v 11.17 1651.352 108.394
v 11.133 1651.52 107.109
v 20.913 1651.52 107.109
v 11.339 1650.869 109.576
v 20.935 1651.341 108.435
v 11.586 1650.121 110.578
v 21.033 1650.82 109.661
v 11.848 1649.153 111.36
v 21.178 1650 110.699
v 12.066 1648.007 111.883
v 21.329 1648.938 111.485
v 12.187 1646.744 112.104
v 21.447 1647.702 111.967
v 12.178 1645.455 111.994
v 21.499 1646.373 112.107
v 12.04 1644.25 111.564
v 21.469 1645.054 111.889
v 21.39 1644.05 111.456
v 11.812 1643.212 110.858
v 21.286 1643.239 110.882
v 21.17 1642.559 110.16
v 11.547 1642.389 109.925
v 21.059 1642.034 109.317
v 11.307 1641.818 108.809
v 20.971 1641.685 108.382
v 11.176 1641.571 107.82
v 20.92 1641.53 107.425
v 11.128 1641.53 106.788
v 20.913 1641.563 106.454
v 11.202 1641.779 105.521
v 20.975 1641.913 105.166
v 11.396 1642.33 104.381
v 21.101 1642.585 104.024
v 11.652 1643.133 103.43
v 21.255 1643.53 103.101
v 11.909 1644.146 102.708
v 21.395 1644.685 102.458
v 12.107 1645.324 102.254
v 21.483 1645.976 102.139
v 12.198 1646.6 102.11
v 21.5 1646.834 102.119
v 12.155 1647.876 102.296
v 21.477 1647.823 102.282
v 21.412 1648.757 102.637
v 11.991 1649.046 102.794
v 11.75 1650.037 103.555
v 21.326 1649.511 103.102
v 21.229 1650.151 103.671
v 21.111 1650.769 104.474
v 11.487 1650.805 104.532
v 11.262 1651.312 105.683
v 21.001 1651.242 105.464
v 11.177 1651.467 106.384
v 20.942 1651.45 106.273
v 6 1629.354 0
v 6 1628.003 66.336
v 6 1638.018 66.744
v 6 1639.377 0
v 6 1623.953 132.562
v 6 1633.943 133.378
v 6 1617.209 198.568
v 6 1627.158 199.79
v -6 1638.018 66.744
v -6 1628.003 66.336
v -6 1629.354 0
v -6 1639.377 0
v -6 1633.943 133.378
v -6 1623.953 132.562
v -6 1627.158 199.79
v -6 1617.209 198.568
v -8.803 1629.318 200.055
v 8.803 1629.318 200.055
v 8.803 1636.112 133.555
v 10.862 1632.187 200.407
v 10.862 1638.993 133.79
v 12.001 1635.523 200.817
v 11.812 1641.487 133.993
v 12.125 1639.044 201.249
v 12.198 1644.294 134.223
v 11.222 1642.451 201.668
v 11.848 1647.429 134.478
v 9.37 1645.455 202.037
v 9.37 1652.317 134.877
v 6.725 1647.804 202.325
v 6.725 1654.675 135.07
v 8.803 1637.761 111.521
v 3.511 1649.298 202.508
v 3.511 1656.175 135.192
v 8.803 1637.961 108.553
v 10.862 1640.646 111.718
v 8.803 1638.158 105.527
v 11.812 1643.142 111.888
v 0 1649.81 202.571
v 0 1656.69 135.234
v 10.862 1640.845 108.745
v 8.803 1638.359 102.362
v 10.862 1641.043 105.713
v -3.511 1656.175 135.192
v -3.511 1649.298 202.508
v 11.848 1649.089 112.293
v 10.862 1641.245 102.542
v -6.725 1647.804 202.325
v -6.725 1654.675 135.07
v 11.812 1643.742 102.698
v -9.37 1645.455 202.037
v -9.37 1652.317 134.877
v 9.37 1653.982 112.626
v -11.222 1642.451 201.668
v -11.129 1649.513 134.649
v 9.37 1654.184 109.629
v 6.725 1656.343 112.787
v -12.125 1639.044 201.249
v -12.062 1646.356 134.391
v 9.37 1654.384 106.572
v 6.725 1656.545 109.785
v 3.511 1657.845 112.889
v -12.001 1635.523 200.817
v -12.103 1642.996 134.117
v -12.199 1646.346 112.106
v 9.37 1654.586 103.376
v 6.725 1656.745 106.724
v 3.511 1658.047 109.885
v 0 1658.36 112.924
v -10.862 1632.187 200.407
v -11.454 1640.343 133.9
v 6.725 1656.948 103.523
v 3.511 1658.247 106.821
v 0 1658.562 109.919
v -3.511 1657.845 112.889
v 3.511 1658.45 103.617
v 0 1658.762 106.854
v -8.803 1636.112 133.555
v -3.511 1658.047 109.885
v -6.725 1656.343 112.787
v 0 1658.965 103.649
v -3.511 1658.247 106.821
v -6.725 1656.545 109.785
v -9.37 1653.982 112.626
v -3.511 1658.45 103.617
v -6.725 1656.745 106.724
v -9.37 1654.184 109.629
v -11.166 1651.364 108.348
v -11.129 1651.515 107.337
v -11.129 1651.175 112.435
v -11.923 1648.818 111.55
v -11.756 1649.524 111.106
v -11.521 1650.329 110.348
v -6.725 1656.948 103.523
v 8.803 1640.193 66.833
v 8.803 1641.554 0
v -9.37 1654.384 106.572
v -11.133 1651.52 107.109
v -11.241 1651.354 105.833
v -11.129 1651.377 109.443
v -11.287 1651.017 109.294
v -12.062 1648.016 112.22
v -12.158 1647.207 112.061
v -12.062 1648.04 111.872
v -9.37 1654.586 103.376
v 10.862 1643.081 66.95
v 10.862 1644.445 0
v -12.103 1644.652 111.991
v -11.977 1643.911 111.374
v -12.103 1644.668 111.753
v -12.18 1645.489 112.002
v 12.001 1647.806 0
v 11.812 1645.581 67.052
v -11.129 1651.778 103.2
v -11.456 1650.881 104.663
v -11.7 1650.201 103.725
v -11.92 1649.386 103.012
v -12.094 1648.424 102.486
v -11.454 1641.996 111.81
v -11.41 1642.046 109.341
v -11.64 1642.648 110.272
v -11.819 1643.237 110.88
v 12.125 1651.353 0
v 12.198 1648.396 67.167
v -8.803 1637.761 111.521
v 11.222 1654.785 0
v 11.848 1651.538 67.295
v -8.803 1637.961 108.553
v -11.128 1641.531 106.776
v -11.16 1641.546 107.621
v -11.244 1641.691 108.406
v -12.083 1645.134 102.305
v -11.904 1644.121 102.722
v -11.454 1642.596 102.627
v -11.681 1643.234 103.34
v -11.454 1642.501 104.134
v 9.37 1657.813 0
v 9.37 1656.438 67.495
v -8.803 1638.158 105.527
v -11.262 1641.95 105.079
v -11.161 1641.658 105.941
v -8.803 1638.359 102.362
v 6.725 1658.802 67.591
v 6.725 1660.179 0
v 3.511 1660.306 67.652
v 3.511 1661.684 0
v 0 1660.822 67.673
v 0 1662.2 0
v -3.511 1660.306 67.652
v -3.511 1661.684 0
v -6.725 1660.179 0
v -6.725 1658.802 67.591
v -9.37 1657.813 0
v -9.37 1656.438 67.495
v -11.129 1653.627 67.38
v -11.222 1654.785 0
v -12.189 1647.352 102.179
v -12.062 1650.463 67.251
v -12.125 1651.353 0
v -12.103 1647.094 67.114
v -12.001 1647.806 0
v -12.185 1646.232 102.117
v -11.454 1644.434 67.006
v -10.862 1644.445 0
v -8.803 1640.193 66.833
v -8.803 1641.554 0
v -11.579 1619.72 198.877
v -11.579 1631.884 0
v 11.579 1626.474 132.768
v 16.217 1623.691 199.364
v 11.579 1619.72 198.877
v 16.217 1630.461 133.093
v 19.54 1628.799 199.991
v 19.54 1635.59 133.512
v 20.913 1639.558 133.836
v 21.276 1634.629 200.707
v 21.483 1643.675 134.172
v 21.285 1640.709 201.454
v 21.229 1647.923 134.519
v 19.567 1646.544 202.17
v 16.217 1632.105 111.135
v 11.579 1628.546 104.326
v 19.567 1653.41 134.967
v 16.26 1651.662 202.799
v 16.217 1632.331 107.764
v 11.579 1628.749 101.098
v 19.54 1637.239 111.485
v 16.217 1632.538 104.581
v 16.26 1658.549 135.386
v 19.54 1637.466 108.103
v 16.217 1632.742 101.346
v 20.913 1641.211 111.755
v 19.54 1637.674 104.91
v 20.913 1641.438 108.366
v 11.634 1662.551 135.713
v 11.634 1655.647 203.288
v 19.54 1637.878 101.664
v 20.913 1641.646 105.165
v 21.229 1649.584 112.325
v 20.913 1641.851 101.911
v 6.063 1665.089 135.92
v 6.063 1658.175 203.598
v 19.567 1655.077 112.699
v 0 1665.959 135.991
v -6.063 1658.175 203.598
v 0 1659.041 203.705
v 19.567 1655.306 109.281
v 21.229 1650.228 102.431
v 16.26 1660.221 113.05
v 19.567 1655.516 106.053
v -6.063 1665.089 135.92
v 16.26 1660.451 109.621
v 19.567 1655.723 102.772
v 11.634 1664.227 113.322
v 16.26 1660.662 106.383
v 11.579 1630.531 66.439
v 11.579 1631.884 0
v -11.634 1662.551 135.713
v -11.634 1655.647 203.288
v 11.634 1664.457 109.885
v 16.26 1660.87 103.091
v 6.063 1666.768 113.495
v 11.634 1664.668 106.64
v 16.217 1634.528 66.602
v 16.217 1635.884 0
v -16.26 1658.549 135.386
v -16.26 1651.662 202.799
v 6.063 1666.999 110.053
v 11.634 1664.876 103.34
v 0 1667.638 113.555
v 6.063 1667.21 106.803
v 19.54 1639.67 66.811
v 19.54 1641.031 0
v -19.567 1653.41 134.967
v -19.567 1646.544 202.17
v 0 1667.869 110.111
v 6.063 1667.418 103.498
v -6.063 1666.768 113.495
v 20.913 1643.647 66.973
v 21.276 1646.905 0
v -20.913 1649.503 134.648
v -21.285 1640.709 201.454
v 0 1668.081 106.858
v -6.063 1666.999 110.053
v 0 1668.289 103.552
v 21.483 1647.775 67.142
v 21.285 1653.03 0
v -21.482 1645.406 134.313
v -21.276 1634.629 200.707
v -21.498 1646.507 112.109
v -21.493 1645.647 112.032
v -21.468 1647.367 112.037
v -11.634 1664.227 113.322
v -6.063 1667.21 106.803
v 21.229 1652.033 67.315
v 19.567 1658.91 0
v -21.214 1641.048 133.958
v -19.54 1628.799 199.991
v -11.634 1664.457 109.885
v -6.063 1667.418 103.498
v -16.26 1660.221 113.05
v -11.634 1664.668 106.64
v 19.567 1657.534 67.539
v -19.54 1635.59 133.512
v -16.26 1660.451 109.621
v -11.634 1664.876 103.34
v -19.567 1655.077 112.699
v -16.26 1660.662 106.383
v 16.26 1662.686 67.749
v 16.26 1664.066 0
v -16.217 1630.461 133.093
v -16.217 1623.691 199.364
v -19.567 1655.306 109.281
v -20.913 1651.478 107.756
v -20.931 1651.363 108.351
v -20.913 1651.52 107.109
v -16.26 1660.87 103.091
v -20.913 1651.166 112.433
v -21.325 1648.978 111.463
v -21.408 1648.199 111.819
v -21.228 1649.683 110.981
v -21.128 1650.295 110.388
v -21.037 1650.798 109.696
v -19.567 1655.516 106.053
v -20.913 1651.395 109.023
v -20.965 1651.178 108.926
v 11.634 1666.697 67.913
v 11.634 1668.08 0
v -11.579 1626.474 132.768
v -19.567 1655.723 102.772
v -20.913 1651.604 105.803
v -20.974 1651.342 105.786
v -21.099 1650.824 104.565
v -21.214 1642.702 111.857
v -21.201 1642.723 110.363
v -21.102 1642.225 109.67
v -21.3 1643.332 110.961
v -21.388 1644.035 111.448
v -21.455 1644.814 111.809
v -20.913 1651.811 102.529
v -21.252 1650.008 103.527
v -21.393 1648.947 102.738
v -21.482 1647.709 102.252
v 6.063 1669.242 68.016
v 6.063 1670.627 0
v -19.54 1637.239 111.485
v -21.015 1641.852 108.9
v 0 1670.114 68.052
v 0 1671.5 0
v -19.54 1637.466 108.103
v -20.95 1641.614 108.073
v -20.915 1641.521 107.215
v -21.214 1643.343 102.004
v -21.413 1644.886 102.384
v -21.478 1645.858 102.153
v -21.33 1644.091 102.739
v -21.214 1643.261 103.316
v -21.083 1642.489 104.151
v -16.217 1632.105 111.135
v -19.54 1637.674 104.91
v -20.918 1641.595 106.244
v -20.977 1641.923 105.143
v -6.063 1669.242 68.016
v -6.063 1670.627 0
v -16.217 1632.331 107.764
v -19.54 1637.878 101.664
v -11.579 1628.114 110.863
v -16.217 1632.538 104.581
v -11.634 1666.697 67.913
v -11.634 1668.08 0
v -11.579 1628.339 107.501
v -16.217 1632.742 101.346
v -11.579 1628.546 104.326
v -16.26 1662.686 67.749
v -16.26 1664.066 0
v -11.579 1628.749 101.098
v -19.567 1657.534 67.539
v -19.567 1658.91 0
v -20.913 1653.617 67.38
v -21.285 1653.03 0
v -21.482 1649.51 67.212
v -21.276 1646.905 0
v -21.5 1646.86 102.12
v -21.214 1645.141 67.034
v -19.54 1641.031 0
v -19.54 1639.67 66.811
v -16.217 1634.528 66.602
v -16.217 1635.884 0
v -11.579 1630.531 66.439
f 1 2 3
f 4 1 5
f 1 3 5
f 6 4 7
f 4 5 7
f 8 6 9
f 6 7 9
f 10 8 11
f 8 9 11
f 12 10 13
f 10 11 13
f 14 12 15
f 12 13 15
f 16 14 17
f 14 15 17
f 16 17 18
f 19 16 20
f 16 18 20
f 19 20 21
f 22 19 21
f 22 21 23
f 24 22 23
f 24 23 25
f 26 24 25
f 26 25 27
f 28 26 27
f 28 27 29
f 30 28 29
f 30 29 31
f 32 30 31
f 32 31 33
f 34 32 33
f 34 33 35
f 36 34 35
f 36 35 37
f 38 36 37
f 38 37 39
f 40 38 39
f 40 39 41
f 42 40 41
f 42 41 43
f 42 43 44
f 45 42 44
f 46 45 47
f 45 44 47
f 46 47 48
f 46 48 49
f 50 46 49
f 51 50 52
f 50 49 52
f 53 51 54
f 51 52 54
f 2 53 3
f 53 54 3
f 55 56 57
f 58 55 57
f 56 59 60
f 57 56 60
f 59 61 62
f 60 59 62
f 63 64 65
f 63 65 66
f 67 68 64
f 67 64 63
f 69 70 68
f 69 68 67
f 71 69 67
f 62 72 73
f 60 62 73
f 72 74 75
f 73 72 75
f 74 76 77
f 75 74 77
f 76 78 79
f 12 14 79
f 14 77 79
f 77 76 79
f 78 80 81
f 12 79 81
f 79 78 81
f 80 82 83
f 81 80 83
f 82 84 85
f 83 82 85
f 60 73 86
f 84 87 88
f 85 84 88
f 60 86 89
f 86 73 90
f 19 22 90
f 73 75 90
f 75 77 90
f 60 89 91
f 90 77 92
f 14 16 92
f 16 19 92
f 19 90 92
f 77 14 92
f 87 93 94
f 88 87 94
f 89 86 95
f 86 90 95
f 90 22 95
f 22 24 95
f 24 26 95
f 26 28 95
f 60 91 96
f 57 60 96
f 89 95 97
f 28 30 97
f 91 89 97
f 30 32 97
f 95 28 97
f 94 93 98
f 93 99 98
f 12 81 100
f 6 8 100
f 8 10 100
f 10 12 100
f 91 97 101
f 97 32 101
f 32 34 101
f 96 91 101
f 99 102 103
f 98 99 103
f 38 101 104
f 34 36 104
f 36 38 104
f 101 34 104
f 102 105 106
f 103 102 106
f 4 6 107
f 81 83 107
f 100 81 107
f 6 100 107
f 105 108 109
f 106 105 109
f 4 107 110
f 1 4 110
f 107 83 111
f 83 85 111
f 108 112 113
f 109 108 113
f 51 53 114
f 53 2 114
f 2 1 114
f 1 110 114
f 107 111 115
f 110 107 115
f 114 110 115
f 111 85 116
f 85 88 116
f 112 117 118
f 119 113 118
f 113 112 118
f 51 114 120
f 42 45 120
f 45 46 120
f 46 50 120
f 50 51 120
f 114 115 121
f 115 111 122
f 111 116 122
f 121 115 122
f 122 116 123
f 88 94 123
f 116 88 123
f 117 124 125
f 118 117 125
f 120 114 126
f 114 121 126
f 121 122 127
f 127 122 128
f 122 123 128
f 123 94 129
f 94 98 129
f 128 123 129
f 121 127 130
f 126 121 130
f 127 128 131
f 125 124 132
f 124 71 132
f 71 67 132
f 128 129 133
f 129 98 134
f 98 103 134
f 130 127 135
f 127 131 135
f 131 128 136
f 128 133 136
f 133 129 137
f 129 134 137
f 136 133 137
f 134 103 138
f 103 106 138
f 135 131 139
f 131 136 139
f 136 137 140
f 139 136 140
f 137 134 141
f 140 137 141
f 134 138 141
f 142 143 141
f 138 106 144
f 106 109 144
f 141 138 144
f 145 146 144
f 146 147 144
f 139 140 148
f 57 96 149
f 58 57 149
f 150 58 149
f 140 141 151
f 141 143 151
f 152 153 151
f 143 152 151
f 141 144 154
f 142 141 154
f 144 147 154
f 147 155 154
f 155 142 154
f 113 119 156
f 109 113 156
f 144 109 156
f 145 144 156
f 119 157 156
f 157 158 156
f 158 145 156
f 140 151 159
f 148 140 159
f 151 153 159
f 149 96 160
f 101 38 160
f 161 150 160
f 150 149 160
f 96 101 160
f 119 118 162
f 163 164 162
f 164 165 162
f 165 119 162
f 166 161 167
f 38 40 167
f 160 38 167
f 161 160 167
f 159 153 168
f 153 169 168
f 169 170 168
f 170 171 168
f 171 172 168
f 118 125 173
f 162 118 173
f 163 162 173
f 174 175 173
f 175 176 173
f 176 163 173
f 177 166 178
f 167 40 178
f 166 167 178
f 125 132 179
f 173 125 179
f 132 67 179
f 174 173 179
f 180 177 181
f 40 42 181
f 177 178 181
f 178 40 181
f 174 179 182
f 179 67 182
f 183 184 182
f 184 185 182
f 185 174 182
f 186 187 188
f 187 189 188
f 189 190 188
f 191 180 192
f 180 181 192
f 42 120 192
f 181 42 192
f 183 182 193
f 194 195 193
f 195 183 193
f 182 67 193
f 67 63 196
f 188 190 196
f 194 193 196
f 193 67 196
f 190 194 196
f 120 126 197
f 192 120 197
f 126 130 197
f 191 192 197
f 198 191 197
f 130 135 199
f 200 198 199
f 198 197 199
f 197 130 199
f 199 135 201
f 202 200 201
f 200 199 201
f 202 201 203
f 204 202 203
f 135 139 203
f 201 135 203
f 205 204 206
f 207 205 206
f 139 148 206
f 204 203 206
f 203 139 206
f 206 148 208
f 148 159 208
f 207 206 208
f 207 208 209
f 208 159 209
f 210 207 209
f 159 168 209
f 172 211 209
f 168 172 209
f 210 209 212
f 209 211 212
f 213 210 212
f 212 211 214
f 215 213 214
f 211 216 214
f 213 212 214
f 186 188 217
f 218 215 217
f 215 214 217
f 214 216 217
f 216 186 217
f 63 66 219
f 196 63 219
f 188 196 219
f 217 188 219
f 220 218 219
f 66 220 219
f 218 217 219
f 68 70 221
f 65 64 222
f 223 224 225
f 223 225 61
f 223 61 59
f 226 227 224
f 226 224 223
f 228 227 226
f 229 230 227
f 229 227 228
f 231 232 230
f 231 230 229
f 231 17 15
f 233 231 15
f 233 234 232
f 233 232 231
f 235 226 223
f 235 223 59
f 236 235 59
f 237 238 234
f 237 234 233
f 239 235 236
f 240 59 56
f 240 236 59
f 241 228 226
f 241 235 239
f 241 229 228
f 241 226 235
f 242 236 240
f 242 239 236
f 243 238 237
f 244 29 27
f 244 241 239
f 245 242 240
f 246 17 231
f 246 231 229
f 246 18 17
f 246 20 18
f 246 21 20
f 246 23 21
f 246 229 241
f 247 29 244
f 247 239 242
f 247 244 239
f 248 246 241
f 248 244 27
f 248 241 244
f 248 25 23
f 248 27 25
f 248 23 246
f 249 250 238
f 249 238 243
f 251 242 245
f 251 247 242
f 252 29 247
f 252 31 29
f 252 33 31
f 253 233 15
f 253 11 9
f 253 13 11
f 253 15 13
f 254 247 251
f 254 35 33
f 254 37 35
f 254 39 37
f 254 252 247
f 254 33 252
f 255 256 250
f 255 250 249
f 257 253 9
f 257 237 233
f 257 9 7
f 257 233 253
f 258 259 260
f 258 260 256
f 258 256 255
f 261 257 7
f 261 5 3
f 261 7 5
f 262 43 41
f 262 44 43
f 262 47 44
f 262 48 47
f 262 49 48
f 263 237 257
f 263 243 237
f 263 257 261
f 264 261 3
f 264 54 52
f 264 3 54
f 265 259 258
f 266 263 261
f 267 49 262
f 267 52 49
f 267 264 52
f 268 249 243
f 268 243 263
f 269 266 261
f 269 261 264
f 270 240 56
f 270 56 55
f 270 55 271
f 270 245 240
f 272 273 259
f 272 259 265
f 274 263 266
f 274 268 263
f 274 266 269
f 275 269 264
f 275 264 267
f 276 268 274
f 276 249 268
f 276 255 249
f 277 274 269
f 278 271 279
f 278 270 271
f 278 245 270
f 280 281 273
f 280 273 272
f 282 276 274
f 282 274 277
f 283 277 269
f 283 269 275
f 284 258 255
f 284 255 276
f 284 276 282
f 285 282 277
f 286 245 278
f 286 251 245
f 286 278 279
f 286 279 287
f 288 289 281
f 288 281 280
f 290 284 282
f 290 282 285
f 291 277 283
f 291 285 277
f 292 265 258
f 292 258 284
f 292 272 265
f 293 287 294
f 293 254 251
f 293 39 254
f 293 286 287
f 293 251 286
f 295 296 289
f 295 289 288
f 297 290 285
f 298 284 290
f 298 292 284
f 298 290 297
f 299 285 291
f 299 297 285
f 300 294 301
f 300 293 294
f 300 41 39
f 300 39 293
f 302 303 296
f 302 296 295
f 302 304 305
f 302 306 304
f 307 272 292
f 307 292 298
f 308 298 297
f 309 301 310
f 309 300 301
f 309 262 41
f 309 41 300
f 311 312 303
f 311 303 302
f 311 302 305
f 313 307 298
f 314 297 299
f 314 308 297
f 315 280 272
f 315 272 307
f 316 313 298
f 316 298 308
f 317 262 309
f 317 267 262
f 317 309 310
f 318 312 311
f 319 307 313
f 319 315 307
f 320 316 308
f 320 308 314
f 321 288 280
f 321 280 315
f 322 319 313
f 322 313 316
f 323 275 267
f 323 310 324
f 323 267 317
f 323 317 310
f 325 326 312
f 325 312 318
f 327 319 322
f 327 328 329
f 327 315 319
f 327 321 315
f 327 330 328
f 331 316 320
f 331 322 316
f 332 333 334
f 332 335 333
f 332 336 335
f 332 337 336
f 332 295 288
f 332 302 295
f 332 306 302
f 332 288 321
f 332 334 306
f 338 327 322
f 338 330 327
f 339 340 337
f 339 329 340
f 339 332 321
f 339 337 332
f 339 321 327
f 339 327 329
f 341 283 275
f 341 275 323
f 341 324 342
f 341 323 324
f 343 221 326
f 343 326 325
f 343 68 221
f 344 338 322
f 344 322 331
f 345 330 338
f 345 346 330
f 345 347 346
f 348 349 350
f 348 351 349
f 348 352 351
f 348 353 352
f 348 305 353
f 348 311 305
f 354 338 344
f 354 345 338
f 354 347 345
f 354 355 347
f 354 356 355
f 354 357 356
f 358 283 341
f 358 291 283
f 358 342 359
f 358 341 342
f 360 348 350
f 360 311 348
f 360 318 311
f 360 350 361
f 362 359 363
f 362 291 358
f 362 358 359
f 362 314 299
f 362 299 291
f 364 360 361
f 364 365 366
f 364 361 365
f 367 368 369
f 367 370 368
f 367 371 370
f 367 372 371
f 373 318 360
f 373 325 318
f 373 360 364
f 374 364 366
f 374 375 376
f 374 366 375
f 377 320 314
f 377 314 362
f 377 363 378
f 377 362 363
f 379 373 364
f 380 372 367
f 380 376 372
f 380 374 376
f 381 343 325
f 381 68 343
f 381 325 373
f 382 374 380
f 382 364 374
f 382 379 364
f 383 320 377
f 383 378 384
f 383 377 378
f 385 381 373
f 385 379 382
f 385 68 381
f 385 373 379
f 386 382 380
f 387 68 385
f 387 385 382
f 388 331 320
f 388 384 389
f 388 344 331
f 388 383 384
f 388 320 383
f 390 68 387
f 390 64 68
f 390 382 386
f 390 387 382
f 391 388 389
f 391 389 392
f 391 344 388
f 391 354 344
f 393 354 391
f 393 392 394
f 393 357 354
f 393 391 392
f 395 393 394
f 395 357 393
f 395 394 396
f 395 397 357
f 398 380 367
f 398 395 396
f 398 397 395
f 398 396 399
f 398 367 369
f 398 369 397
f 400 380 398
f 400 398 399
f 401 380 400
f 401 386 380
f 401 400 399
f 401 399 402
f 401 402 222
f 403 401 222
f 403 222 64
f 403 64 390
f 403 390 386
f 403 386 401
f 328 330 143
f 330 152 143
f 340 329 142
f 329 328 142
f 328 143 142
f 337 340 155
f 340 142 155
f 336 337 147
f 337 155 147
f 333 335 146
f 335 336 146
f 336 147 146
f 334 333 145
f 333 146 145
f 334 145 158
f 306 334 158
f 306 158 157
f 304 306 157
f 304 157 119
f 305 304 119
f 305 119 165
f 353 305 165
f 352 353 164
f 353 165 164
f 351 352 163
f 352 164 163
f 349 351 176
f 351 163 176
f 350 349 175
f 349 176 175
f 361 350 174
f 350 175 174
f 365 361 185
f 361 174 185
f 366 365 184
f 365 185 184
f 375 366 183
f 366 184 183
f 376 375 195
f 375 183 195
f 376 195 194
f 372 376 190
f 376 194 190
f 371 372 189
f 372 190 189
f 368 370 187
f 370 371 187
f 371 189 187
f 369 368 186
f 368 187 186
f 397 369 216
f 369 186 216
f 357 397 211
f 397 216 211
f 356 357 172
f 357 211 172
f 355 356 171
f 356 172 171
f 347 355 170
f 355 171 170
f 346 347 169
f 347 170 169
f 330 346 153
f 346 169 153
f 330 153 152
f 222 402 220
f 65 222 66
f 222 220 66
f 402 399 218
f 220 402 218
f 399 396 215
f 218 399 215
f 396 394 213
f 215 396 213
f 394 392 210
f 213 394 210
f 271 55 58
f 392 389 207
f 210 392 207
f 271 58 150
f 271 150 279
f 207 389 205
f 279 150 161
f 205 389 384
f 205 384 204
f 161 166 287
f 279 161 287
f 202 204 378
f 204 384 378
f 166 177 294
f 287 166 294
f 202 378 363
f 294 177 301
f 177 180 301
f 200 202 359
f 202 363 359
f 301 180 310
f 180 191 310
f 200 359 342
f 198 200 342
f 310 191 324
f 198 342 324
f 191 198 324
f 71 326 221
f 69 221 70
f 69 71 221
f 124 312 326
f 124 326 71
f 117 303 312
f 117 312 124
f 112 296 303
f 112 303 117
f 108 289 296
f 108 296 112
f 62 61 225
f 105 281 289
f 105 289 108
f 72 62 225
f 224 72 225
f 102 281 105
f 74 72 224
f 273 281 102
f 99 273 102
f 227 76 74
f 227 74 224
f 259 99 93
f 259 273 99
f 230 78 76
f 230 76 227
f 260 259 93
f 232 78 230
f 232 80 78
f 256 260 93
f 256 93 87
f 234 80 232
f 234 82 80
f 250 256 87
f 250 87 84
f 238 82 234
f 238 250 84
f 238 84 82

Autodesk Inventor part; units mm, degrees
ref_plane "YZ Plane" through (0, 0, 0) normal (1, 0, 0) x (0, 1, 0)
ref_plane "XZ Plane" through (0, 0, 0) normal (0, 1, 0) x (-1, 0, 0)
ref_plane "XY Plane" through (0, 0, 0) normal (0, 0, 1) x (1, 0, 0)
sketch "Sketch1" plane through (0, 0, 0) normal (1, 0, 0) x (0, 1, 0)
  circle A0 centre (0, 0) radius 1650
  dimension "d0" = 3300
sketch "Sketch2" plane through (0, 0, 0) normal (0, 0, 1) x (1, 0, 0)
  circle A0 centre (0, 1650) radius 21.5
  circle A1 centre (0, 1650) radius 12.2
  line L0 (-30.1, 0) -> (30.1, 0) projected
  point P0 (0, 0)
  dimension "d1" = 1650
  dimension "d2" = 0
  dimension "d3" = 43
  dimension "d4" = 9.3
revolve "Revolution1" add sketch "Sketch2" angle 7 about axis through (-10, 0, 0) along (1, 0, 0)
sketch "Sketch3" plane through (0, 0, 0) normal (1, 0, 0) x (0, 1, 0)
  line L0 (1642.6517, 530.7226) -> (1398.8963, 530.7226)
  line L1 (1398.8963, 530.7226) -> (1398.8963, -338.3635)
  line L2 (1398.8963, -338.3635) -> (1642.6517, -338.3635)
  line L3 (1642.6517, -338.3635) -> (1642.6517, 530.7226)
  point P0 (0, 0)
extrude "Extrusion1" cut sketch "Sketch3" against normal mid plane 12
sketch "Sketch4" plane through (0, 0, 0) normal (1, 0, 0) x (0, 1, 0)
  circle A0 centre (0, 0) radius 1650
  circle A1 centre (1646.5199, 107.1089) radius 5
  dimension "d8" = 3300
  dimension "d9" = 10
extrude "Extrusion2" cut sketch "Sketch4" along normal mid plane 100 contours A1 A0 | A0 A1 picked at (1644.8813, 106.8012) picked at (1648.186, 107.1089)
equation "\"d0\" = hoop_radius_large"
equation "\"d1\" = 0.5 * d0"
equation "\"d3\" = od"
equation "\"d4\" = t"
equation "\"d8\" = hoop_radius_large"
equation "\"hoop_radius_large\" = 3300"
equation "\"hoop_width_large\" = 51"
equation "\"hoop_thickness_large\" = 4"
equation "\"hoop_width_medium\" = 33.7"
equation "\"hoop_bushing12_od\" = -2 * hoop_thickness_large + hoop_width_large + hoop_bushing12_radialInterference"
equation "\"hoop_bushing12_radialInterference\" = 0"
equation "\"hoop_angle_z\" = 45deg"
equation "\"hoop_bearing_length\" = 5deg"
equation "\"hoop_cable_diam\" = 5"
equation "\"hoop_cable_pulley_diam\" = 22"
equation "\"hoop_thickness_medium\" = 3.2"
equation "\"hoop_thickness_small\" = 2"
equation "\"hoop_bushing12_thickness\" = -hoop_width_medium + hoop_bushing12_od - 2 * hoop_bushing12_radialInterference"
equation "\"hoop_bushing23_od\" = -2 * hoop_thickness_medium + hoop_width_medium + hoop_bushing23_radialInterference"
equation "\"hoop_bushing23_radialInterference\" = 0"
equation "\"hoop_bushing23_thickness\" = -hoop_width_small + hoop_bushing23_od - 2 * hoop_bushing23_radialInterference"
equation "\"hoop_tabs_hole\" = 12"
equation "\"hoop_tabs_thickness\" = 6"
equation "\"hoop_width_small\" = 25.4"
equation "\"rack_tooth_addendum\" = 5"
equation "\"rack_tooth_dedendum\" = 5"
equation "\"rack_tooth_thickness\" = 5"
equation "\"secure_arm_angle\" = 35deg"
equation "\"secure_arm_radii\" = 9"
equation "\"sm_varx_member_tolerance\" = 0"
equation "\"sm_varx_pinPlate_holeDiameter\" = 5"
equation "\"sm_varx_pinPlate_thickness\" = 5"
equation "\"sm_varx_squareBarThickness\" = 2.5"
equation "\"support_baseClamp_platformLengthBuffer\" = 35"
equation "\"support_baseClamp_platformThickness\" = 15"
equation "\"support_baseClamp_platformWidthBuffer\" = 0"
equation "\"support_baseClamp_sleeveHoleDiameter\" = 12"
equation "\"support_baseClamp_sleeveSweepTerminationAngle\" = 55deg"
equation "\"support_baseClamp_thickness\" = 8"
equation "\"support_frame_endHoleBuffer\" = 45"
equation "\"support_frame_squareBarFillet\" = 2"
equation "\"support_frame_squareBarThickness\" = 5"
equation "\"wheelchair_deployed_height\" = 914"
equation "\"wheelchair_deployed_length\" = 1067"
equation "\"wheelchair_deployed_width\" = 635"
equation "\"od\" = hoop_bushing12_od"
equation "\"t\" = hoop_bushing12_thickness"
equation "\"wheelchatir_pos_deploy_angle_0\" = 65deg"
equation "\"wheelchatir_pos_store_angle_0\" = 90deg"
equation "\"wheelchatir_pos_deploy_angle_1\" = 20deg"
equation "\"wheelchatir_pos_store_angle_1\" = 20deg"
properties part number "large_bearings" material "Polyurethane"
